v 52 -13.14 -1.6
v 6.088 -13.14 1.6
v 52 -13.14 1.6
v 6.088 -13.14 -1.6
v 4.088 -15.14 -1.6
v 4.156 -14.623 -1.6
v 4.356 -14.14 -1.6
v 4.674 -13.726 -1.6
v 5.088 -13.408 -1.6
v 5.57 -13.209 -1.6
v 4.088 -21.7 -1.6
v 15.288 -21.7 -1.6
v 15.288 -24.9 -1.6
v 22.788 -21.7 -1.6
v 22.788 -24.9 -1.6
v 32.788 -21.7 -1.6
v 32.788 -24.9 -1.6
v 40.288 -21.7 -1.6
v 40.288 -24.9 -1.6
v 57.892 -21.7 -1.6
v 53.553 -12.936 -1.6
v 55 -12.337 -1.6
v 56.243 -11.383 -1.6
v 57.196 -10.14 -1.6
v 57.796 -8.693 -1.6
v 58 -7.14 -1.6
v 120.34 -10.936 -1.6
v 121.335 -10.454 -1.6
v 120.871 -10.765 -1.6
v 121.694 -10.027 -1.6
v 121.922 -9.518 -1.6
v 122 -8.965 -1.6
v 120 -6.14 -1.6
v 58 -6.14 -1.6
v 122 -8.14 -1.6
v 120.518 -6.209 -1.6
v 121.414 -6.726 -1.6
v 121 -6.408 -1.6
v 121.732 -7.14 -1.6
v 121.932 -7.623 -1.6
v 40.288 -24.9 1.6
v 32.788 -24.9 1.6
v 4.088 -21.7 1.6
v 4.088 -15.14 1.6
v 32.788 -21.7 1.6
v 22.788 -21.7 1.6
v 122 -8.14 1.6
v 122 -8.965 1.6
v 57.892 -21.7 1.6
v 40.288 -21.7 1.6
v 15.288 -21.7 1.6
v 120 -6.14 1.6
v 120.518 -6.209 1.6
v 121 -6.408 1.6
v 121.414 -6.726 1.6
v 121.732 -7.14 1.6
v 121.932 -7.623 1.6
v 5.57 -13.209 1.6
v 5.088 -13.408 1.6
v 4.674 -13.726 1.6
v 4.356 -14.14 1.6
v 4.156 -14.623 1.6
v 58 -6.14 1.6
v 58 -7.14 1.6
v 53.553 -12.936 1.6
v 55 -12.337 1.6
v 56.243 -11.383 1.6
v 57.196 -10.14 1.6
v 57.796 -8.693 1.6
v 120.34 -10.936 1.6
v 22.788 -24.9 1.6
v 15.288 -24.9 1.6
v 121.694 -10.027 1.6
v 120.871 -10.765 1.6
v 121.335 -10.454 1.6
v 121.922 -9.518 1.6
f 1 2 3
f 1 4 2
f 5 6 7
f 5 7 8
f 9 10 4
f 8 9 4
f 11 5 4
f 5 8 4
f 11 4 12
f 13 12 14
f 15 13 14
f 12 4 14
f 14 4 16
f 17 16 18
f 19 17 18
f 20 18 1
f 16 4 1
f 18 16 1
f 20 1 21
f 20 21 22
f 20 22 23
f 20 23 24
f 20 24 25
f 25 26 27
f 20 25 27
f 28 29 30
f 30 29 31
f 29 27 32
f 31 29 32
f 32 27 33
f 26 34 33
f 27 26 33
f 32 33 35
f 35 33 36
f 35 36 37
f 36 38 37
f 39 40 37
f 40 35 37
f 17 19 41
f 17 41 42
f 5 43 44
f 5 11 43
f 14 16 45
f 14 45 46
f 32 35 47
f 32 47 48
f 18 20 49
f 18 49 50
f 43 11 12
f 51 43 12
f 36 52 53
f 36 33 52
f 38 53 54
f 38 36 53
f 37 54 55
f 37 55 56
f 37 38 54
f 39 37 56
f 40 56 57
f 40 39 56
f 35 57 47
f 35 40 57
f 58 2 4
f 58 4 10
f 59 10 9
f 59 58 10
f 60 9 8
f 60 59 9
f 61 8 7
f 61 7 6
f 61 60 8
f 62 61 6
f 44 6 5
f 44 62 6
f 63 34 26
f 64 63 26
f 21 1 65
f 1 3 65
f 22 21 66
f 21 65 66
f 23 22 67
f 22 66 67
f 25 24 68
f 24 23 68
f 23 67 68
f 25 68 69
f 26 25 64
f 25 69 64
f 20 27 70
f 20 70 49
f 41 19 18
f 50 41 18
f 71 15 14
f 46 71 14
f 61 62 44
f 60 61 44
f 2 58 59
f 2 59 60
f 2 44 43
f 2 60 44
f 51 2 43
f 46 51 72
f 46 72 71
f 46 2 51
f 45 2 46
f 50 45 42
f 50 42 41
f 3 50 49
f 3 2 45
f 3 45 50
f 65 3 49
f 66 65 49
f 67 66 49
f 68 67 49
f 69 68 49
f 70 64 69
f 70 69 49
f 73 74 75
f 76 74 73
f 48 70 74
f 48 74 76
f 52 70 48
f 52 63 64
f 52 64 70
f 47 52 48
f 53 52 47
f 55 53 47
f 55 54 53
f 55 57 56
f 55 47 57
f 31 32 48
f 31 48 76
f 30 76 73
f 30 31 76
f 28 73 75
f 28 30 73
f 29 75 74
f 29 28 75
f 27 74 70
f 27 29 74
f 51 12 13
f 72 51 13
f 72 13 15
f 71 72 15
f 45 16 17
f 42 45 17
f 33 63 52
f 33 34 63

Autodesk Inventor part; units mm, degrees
ref_plane "YZ Plane" through (0, 0, 0) normal (1, 0, 0) x (0, 1, 0)
ref_plane "XZ Plane" through (0, 0, 0) normal (0, 1, 0) x (-1, 0, 0)
ref_plane "XY Plane" through (0, 0, 0) normal (0, 0, 1) x (1, 0, 0)
sketch "Sketch1" plane through (0, 0, 0) normal (0, 0, 1) x (1, 0, 0)
  line L0 (58, -6.1405) -> (122, -6.1405)
  line L1 (122, -6.1405) -> (122, -10.6498)
  line L2 (122, -10.6498) -> (57.892, -21.6998)
  line L3 (4.088, -21.6998) -> (15.288, -21.6998)
  line L4 (15.288, -21.6998) -> (15.288, -24.8998)
  line L5 (15.288, -24.8998) -> (22.788, -24.8998)
  line L6 (22.788, -24.8998) -> (22.788, -21.6998)
  line L7 (32.788, -21.6998) -> (32.788, -24.8998)
  line L8 (40.288, -24.8998) -> (40.288, -21.6998)
  line L9 (58, -6.1405) -> (122, -6.1405)
  line L10 (122, -6.1405) -> (122, -10.6498)
  line L11 (57.892, -21.6998) -> (122, -10.6498)
  line L12 (57.892, -21.6998) -> (40.288, -21.6998)
  line L13 (40.288, -24.8998) -> (40.288, -21.6998)
  line L14 (40.288, -24.8998) -> (32.788, -24.8998)
  line L15 (32.788, -24.8998) -> (32.788, -21.6998)
  line L16 (32.788, -21.6998) -> (22.788, -21.6998)
  line L17 (22.788, -24.8998) -> (22.788, -21.6998)
  line L18 (15.288, -24.8998) -> (22.788, -24.8998)
  line L19 (15.288, -24.8998) -> (15.288, -21.6998)
  line L20 (15.288, -21.6998) -> (4.088, -21.6998)
  line L21 (58, -6.1405) -> (58, -13.1405)
  line L22 (4.088, -21.6998) -> (4.088, -13.1405)
  line L23 (4.088, -13.1405) -> (58, -13.1405)
  point P0 (0, 0)
  point P1 (0, 0)
  dimension "d1" = 11.2
  dimension "d2" = 7.5
  dimension "d3" = 10
  dimension "d4" = 7.5
  dimension "d15" = 21.6998
  dimension "d20" = 7
  dimension "d21" = 58
  dimension "d22" = 122
  dimension "d25" = 17.604
  dimension "d27" = 4.088
extrude "Plate1" add sketch "Sketch1" along normal mid plane 3.2
fillet "Corner Round3" radius 6 1 edges at (58, -13.1405, 0)
fillet "Corner Round4" radius 2 3 edges at (122, -6.1405, 0) (122, -10.6498, 0) (4.088, -13.1405, 0)
equation "\"d4\" = d2"
equation "\"d0\" = Thickness"
equation "\"BendRadius\" = Thickness"
equation "\"BendReliefWidth\" = Thickness"
equation "\"BendReliefDepth\" = 0.5 * Thickness"
equation "\"CornerReliefSize\" = 4 * Thickness"
equation "\"MinimumRemnant\" = 2 * Thickness"
equation "\"TransitionRadius\" = BendRadius"
equation "\"JacobiRadiusSize\" = BendRadius"
equation "\"GapSize\" = Thickness"
equation "\"Thickness\" = 3.2"
properties part number "SP9V1 Columna Freno" material "Stainless Steel"
